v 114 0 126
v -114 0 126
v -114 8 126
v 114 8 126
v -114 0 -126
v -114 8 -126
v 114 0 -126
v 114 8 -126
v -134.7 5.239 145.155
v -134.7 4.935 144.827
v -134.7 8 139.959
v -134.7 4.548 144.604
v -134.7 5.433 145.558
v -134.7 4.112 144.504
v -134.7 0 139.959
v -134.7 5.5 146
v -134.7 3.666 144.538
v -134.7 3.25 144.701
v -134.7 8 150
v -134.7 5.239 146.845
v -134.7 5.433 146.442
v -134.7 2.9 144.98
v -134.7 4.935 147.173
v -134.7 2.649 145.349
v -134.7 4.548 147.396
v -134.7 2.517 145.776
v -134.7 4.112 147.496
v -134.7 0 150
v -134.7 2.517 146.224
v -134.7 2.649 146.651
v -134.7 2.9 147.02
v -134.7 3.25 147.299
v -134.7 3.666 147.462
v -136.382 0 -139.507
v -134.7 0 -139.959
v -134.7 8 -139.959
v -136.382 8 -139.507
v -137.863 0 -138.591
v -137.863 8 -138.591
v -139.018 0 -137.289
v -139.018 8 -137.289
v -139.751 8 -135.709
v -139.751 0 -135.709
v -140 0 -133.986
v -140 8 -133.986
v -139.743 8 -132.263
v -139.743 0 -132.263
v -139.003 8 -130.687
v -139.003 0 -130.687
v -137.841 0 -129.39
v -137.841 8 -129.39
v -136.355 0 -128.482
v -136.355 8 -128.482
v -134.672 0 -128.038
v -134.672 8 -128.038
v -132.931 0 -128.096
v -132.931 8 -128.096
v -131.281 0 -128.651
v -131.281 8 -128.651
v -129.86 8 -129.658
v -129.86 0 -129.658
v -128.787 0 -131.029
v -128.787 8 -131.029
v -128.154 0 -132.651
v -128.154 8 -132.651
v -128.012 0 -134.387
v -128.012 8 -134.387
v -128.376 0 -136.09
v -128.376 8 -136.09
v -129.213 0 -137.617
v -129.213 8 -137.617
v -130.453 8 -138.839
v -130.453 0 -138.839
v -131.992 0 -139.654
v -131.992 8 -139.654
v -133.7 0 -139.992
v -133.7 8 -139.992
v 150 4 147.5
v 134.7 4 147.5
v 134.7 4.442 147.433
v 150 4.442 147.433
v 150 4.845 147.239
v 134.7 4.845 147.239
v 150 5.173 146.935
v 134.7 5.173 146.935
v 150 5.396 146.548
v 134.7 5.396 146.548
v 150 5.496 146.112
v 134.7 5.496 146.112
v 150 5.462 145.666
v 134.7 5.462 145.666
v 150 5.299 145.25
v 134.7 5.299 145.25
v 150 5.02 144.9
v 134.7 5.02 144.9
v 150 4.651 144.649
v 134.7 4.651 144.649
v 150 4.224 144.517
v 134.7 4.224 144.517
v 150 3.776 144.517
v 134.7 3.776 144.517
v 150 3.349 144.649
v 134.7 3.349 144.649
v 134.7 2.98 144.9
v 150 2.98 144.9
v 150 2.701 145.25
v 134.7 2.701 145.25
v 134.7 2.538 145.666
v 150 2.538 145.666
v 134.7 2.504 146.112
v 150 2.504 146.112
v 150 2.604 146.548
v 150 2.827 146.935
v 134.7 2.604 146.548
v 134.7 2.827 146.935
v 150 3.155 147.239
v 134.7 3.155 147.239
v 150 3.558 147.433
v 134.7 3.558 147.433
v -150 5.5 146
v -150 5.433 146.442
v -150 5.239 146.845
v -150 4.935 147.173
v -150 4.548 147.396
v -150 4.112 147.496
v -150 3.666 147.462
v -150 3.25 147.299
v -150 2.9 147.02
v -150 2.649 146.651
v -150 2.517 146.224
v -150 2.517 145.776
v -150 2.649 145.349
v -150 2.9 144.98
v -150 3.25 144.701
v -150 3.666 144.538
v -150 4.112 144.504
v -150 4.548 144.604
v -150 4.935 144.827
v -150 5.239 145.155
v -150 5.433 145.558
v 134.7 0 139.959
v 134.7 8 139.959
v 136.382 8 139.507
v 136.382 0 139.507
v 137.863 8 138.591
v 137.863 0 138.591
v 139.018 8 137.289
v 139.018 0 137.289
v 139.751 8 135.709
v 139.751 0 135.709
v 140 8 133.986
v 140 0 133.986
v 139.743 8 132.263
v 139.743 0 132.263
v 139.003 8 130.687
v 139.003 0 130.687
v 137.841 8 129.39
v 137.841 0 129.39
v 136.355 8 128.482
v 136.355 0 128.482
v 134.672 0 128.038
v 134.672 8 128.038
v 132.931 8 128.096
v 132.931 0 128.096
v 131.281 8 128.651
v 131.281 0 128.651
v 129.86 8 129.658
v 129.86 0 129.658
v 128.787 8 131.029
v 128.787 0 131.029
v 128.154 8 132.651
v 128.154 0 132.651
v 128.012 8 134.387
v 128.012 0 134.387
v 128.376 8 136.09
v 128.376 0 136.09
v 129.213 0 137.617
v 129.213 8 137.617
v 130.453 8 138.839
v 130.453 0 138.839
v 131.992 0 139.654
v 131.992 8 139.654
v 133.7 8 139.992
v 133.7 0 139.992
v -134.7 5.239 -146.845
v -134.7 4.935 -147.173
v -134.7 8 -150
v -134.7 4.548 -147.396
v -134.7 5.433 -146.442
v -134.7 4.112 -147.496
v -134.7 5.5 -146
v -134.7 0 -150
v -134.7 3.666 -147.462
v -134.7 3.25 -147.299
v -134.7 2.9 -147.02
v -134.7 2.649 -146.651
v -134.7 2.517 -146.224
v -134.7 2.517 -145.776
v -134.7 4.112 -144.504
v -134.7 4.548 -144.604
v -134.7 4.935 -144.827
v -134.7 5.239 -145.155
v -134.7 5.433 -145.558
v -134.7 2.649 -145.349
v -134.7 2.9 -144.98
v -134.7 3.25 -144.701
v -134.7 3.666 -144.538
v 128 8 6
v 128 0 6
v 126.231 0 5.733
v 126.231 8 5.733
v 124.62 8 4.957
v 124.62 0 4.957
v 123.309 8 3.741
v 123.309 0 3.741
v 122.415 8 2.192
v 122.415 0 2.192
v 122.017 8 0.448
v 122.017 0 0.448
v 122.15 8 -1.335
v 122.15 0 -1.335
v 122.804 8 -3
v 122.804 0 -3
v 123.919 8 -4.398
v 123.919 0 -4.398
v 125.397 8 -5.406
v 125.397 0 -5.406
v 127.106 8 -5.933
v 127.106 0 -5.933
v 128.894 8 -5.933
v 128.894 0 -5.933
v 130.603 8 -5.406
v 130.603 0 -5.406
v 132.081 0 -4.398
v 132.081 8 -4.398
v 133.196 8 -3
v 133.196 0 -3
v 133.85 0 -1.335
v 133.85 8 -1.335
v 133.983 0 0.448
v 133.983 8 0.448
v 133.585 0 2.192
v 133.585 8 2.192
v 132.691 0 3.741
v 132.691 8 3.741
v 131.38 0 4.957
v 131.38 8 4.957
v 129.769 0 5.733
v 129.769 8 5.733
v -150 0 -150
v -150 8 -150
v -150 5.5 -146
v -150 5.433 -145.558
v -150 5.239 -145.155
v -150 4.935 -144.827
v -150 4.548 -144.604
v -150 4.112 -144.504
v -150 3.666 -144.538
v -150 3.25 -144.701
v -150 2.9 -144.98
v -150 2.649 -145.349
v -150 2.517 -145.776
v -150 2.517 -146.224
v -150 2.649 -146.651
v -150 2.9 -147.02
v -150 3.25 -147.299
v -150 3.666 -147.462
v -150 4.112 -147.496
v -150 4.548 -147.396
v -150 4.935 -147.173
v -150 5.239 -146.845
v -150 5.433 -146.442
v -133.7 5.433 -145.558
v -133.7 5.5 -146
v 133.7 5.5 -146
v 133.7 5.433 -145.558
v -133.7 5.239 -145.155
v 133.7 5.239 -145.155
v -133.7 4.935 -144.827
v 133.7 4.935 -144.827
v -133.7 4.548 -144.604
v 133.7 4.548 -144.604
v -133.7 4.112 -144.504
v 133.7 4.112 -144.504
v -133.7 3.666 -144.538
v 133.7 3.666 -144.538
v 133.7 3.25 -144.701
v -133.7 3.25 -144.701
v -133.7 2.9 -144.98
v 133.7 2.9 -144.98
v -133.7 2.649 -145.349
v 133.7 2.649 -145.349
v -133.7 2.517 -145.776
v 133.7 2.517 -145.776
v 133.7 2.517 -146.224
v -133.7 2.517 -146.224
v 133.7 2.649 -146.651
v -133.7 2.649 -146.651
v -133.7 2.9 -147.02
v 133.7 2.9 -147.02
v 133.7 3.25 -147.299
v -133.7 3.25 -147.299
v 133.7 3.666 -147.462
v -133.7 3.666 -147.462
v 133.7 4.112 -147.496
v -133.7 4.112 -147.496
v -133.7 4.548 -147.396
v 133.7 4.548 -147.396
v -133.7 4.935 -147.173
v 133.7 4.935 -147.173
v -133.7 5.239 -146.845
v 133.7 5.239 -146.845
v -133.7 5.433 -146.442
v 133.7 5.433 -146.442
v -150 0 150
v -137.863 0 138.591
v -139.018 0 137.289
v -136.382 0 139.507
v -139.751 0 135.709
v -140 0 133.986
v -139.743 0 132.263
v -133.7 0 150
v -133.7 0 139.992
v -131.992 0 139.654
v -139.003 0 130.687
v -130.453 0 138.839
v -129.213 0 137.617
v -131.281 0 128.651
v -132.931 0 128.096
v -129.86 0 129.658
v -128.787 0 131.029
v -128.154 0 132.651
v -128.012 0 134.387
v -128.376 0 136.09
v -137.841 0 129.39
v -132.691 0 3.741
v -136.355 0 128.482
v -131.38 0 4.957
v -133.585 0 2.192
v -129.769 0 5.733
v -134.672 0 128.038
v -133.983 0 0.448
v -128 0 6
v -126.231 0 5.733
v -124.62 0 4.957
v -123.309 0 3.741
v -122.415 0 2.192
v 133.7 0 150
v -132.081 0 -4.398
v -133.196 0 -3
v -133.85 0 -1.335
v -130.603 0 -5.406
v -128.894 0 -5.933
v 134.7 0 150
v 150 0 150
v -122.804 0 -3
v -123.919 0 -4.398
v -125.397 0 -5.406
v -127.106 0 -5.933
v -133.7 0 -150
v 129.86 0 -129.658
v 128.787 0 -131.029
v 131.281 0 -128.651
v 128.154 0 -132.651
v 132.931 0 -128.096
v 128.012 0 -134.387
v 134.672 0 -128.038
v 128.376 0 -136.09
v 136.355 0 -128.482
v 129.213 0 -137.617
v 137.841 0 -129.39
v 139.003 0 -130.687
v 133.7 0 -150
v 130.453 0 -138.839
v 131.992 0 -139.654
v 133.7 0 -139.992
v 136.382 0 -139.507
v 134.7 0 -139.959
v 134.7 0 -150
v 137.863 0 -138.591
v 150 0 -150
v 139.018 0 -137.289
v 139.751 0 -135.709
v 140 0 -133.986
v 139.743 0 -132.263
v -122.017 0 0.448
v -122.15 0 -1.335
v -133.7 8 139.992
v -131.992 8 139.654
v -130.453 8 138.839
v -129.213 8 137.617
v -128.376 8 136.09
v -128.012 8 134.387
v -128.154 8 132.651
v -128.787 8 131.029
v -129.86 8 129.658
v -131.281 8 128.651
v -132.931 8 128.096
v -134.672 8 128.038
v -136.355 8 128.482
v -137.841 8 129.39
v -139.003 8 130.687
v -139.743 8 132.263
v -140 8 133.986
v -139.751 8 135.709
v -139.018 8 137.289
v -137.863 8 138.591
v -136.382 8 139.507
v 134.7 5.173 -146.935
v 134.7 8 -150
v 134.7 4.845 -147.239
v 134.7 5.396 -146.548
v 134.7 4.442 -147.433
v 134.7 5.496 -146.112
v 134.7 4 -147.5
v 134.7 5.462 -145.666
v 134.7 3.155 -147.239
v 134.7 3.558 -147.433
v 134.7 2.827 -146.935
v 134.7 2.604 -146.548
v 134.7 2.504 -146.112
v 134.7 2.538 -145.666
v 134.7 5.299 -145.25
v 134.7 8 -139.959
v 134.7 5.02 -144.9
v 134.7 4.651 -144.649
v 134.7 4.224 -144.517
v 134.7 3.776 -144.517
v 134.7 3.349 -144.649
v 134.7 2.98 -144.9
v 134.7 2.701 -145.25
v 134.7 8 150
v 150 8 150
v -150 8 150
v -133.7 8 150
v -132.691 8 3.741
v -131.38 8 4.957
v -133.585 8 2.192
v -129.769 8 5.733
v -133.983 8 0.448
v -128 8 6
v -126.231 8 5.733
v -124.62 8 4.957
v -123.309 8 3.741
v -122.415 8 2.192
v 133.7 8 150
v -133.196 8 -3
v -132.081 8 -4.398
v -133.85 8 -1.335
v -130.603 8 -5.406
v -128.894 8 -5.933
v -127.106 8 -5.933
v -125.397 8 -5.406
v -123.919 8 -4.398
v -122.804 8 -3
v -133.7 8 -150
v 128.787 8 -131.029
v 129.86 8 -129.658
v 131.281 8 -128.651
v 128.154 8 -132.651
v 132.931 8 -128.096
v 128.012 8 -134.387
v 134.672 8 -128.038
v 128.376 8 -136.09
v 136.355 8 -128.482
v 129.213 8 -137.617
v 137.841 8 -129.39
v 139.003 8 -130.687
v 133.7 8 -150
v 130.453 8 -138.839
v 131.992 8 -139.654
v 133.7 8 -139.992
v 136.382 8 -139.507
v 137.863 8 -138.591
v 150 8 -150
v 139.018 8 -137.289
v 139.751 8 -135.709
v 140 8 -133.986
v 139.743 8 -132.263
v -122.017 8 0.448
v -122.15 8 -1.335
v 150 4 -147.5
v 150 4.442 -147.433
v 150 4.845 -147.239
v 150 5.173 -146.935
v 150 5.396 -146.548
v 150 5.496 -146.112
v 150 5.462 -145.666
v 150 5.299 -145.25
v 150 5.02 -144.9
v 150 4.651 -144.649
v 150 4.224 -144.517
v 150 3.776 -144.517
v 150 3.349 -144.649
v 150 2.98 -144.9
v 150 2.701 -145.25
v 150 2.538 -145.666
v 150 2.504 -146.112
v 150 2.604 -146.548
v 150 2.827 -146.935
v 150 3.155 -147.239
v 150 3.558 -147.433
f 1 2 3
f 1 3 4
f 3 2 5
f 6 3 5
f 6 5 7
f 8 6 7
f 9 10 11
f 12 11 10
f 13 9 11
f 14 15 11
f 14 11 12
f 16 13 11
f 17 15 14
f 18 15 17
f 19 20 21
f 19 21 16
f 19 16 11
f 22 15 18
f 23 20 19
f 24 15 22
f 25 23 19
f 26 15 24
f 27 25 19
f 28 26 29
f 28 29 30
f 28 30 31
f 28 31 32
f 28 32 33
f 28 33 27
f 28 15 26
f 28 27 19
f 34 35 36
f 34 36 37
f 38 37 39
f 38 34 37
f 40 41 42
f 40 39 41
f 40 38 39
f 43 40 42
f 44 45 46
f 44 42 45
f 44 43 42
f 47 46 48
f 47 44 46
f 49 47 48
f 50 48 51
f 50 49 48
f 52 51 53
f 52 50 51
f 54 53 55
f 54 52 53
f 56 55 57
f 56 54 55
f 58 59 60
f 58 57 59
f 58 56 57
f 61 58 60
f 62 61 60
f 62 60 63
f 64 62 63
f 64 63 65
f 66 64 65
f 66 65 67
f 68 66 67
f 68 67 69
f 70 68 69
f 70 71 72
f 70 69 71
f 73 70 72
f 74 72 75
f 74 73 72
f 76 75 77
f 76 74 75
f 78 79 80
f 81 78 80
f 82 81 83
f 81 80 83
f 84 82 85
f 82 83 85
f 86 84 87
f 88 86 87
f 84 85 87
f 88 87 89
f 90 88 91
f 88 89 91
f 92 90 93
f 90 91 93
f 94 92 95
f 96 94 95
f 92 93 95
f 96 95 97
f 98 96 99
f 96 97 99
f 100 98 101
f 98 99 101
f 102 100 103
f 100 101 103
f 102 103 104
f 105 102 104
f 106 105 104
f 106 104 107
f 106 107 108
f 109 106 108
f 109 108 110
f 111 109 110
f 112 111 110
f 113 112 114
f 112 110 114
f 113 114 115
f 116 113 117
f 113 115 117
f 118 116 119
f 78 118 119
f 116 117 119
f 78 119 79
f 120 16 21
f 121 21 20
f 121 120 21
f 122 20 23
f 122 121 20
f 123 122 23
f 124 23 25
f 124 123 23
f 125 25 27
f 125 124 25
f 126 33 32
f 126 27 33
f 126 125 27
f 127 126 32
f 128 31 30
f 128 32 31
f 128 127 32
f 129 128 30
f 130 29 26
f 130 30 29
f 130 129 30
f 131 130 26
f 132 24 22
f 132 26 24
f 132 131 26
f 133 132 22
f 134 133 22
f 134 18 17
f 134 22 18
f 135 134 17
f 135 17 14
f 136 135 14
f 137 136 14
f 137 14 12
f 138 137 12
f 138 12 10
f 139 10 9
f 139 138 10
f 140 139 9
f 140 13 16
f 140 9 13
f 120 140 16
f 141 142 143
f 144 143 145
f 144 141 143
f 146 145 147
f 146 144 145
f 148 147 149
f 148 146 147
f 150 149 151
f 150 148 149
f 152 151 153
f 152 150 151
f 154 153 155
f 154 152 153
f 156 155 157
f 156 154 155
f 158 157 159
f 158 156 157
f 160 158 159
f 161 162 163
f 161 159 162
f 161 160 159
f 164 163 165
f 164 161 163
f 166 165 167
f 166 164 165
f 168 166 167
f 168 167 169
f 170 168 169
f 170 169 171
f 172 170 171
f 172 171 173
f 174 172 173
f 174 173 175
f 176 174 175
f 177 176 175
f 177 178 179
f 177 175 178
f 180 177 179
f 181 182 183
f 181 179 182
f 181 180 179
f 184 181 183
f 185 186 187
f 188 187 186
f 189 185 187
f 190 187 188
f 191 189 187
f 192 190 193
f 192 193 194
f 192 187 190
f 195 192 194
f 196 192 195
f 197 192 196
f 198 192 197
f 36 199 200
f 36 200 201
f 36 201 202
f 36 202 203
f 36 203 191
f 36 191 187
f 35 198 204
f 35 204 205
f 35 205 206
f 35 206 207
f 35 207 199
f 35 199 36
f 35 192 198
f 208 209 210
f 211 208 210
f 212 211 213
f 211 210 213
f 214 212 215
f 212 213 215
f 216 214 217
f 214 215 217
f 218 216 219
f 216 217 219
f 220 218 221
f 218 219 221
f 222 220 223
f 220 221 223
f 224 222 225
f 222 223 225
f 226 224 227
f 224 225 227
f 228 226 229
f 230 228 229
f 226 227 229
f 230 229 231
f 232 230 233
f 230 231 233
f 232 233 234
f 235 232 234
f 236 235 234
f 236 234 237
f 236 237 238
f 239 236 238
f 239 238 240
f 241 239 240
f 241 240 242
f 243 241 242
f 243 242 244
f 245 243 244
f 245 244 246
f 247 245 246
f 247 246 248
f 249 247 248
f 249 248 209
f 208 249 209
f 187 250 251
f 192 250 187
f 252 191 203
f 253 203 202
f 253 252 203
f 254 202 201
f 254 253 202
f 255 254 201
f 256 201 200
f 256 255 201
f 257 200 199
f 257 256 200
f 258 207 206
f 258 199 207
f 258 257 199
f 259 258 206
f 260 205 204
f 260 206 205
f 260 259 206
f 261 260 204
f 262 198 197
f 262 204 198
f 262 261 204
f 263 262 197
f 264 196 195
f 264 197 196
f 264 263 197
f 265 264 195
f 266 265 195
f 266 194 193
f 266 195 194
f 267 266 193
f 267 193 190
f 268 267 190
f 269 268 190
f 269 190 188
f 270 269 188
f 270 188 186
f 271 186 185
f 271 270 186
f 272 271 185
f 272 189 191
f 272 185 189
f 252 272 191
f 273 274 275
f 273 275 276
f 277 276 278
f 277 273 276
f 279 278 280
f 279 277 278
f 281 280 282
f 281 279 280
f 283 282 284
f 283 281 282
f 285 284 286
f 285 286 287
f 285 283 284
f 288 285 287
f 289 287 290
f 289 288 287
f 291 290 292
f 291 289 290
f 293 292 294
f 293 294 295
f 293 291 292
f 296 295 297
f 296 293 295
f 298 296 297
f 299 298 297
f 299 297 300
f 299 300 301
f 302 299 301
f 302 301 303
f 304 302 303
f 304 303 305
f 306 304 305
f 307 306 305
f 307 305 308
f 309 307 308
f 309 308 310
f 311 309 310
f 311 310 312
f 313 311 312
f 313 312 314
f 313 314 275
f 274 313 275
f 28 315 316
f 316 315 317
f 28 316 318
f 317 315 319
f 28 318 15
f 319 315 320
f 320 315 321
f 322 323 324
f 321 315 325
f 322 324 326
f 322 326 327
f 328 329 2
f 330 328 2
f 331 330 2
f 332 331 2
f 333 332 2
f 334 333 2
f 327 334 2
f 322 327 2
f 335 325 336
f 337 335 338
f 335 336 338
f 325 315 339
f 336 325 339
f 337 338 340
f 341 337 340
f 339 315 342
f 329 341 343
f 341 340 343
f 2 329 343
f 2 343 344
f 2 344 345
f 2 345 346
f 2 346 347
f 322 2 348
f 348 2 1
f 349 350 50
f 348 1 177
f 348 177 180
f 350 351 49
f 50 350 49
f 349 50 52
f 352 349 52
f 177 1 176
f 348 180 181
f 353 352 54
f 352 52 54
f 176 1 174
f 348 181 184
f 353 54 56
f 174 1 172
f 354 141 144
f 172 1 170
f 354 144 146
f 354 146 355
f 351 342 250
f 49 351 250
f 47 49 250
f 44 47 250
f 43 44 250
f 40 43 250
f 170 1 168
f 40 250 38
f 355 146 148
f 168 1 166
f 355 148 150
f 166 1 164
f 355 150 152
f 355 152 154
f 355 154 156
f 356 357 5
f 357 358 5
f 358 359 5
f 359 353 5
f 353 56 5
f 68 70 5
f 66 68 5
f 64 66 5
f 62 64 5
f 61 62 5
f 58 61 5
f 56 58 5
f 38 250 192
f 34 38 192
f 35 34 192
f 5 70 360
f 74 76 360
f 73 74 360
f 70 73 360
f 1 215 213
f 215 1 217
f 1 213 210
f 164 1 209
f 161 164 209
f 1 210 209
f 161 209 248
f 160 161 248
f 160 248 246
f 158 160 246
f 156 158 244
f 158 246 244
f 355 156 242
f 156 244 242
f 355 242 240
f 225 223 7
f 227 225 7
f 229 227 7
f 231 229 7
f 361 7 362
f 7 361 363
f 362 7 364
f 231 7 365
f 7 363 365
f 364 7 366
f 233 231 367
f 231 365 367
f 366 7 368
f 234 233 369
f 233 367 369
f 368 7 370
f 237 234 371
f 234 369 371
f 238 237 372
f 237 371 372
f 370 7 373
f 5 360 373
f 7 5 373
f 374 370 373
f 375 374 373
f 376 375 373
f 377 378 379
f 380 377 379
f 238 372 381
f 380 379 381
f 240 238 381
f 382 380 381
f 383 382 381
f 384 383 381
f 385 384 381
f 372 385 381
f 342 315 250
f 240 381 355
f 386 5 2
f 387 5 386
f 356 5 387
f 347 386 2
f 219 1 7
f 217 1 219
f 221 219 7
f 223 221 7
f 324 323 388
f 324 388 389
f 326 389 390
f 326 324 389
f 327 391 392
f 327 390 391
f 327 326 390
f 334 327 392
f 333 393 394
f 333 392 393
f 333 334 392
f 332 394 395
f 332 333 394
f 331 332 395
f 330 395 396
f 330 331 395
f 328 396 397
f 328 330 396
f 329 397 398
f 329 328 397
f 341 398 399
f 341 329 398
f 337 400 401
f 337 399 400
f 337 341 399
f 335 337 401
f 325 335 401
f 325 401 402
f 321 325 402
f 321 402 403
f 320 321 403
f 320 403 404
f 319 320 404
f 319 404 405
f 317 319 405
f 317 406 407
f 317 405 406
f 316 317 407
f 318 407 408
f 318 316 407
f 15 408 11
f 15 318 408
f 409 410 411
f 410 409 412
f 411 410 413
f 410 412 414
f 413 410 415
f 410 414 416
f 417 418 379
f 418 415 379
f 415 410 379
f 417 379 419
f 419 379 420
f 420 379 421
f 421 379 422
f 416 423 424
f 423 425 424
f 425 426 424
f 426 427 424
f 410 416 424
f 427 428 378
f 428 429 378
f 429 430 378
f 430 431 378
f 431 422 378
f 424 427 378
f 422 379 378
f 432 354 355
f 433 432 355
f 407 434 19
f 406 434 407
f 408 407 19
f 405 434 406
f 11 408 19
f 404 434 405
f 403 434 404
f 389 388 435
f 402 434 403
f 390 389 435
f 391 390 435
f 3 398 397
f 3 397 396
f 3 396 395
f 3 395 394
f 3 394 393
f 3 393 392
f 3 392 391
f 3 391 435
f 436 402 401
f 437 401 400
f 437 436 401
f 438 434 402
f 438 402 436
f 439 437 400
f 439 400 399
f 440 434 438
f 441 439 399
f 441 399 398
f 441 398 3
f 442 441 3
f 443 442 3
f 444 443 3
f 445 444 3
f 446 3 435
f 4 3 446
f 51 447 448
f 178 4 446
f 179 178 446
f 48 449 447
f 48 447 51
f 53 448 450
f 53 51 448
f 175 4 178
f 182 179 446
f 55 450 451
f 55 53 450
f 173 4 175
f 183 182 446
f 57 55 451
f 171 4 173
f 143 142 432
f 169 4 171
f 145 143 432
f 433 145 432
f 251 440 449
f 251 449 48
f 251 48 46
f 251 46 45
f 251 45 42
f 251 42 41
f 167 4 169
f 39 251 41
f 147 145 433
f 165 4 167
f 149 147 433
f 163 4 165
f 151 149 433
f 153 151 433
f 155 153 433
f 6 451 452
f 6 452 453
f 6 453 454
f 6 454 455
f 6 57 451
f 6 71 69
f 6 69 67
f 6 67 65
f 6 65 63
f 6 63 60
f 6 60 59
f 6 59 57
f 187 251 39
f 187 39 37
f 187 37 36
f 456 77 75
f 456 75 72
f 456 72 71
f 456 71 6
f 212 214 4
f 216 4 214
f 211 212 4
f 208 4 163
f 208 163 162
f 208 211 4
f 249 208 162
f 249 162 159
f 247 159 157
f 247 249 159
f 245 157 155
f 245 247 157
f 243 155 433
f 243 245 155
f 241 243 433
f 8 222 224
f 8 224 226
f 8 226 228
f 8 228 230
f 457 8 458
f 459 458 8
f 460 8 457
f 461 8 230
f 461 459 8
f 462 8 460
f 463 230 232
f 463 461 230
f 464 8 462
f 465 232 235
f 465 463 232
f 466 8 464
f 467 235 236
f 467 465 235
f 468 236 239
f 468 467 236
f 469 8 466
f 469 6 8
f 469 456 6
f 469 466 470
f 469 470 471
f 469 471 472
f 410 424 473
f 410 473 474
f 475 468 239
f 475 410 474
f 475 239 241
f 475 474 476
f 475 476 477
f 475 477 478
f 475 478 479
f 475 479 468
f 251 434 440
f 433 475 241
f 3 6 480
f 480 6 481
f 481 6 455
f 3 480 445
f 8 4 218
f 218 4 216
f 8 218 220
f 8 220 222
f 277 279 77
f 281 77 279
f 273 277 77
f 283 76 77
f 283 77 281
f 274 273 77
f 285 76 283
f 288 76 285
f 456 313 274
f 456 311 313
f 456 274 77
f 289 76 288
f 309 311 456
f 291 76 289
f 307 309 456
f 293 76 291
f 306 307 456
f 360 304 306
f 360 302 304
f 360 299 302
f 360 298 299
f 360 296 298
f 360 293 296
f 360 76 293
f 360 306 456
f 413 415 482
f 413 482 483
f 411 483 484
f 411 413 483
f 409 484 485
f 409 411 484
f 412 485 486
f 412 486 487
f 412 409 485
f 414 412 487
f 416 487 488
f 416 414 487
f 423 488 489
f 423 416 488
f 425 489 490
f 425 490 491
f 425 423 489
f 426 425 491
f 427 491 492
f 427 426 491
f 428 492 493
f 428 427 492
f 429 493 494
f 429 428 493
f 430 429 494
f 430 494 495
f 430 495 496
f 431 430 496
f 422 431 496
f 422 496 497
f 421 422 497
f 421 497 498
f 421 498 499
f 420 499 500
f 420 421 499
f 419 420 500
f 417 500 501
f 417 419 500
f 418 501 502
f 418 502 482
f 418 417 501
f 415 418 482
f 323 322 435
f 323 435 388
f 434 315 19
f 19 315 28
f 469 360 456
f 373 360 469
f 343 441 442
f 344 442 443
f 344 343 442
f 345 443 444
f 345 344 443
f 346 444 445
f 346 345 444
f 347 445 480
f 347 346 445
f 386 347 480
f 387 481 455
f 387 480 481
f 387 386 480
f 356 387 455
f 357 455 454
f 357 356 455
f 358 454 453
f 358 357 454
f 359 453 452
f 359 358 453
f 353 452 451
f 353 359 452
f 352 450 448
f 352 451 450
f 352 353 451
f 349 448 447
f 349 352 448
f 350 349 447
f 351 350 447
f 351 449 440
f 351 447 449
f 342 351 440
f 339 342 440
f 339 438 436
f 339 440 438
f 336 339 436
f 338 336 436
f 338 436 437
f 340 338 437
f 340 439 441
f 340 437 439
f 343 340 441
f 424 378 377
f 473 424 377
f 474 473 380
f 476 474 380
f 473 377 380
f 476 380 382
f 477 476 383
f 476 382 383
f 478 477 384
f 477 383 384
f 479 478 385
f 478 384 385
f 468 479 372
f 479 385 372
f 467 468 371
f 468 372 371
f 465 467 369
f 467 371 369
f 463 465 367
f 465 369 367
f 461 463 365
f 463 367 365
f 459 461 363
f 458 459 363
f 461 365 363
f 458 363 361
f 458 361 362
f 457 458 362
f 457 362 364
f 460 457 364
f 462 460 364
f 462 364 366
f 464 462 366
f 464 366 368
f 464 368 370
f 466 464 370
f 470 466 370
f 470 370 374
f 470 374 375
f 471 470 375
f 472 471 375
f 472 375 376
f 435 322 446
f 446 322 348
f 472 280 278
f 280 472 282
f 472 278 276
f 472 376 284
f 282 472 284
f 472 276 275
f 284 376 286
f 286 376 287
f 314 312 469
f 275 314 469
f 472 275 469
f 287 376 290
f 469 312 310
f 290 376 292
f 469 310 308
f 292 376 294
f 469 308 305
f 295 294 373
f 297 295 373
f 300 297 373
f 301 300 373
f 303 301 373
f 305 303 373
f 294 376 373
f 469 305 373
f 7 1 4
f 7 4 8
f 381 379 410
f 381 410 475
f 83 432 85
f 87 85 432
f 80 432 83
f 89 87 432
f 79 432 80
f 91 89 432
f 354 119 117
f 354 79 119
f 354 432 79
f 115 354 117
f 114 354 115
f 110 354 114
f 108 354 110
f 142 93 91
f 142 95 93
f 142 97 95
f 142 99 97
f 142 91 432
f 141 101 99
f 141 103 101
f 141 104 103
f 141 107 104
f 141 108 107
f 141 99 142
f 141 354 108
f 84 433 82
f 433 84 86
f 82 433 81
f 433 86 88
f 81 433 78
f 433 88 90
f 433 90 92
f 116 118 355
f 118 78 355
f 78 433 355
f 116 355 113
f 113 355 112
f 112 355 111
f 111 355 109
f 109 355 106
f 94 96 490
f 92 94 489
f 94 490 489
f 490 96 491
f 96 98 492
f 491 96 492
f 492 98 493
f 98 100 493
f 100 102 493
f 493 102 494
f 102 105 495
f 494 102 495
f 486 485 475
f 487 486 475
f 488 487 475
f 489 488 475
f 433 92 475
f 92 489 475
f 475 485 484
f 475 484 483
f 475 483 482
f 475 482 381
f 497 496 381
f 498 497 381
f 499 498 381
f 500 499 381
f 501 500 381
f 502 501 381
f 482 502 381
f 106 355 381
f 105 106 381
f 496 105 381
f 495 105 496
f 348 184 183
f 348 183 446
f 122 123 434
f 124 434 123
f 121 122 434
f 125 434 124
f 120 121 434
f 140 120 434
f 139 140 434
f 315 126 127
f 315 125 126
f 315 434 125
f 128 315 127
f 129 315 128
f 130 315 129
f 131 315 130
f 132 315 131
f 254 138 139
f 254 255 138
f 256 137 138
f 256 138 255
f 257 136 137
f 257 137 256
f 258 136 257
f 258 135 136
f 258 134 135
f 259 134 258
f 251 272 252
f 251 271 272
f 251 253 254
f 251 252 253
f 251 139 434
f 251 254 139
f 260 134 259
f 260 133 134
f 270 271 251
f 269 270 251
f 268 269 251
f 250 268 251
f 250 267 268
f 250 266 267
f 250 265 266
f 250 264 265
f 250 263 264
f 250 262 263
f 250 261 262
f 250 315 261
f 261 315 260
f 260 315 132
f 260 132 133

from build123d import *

# Parameters (mm, degrees)
SKETCH1_W           = 300
SKETCH1_H           = 300
SKETCH1_W_2         = 228
SKETCH1_H_2         = 252
BOSS_EXTRUDE1_DEPTH = 8
CUT_EXTRUDE1_DEPTH  = 213.282830205
CUT_EXTRUDE2_START  = -15.3
SKETCH3_R           = 1.5
CUT_EXTRUDE2_DEPTH  = 15.3
MIRROR4_START       = -151
MIRROR4_OUTLINE_R   = 1.5
MIRROR4_DEPTH       = 284.7
MIRROR4_2_OUTLINE_R = 1.5
MIRROR4_2_DEPTH     = 17.3
MIRROR4_START_2     = -1
MIRROR4_3_DEPTH     = 10
SKETCH4_R           = 6
CUT_EXTRUDE3_DEPTH  = 213.282830205


with BuildPart() as part:
    # Sketch1 → Boss-Extrude1 (new body)
    with BuildSketch(Plane(origin=(0, 0, 0), x_dir=(1, 0, 0), z_dir=(0, 1, 0))):
        Rectangle(SKETCH1_W, SKETCH1_H)
        Rectangle(SKETCH1_W_2, SKETCH1_H_2, mode=Mode.SUBTRACT)
    extrude(amount=BOSS_EXTRUDE1_DEPTH)

    # Sketch2 → Cut-Extrude1 (cut, through all)
    with BuildSketch(Plane(origin=(0, 0, 0), x_dir=(1, 0, 0), z_dir=(0, 1, 0))):
        with BuildLine():
            Line((133.7, 150), (134.7, 150))
            Line((134.7, 150), (134.7, 139.959026766))
            ThreePointArc((134.7, 139.959026766), (133.799301132, 128.003357609), (133.7, 139.992495307))
            Line((133.7, 139.992495307), (133.7, 150))
        make_face()
    cut_extrude1 = extrude(amount=CUT_EXTRUDE1_DEPTH, mode=Mode.SUBTRACT)

    # Sketch3 → Cut-Extrude2 (cut)
    with BuildSketch(Plane(origin=(150, 0, 0), x_dir=(0, 0, -1), z_dir=(1, 0, 0)).offset(CUT_EXTRUDE2_START)):
        with Locations((146, 4)):
            Circle(SKETCH3_R)
    cut_extrude2 = extrude(amount=CUT_EXTRUDE2_DEPTH, mode=Mode.SUBTRACT)

    # Mirror3: Cut-Extrude1, Cut-Extrude2 across plane
    add(cut_extrude1.mirror(Plane.XY), mode=Mode.SUBTRACT)
    add(cut_extrude2.mirror(Plane.XY), mode=Mode.SUBTRACT)

    # Mirror4: read off the stored shape, not the designer's step
    # Mirror4 outline → Mirror4 (cut)
    with BuildSketch(Plane.YZ.offset(MIRROR4_START)):
        with Locations((4, -146)):
            Circle(MIRROR4_OUTLINE_R)
    extrude(amount=MIRROR4_DEPTH, mode=Mode.SUBTRACT)

    # Mirror4 2 outline → Mirror4 2 (cut)
    with BuildSketch(Plane.YZ.offset(MIRROR4_START)):
        with Locations((4, 146)):
            Circle(MIRROR4_2_OUTLINE_R)
    extrude(amount=MIRROR4_2_DEPTH, mode=Mode.SUBTRACT)

    # Mirror4 3 outline → Mirror4 3 (cut)
    with BuildSketch(Plane(origin=(0, 0, 0), x_dir=(1, 0, 0), z_dir=(0, 1, 0)).offset(MIRROR4_START_2)):
        with BuildLine():
            ThreePointArc((-134.7, 139.959026766), (-133.799301125, 128.003357609), (-133.7, 139.992495307))
            Line((-133.7, 139.992495307), (-133.7, 150))
            Line((-133.7, 150), (-134.7, 150))
            Line((-134.7, 150), (-134.7, 139.959026766))
        make_face()
        with BuildLine():
            Line((-133.7, -150), (-133.7, -139.992495307))
            ThreePointArc((-133.7, -139.992495307), (-133.799301125, -128.003357609), (-134.7, -139.959026766))
            Line((-134.7, -139.959026766), (-134.7, -150))
            Line((-134.7, -150), (-133.7, -150))
        make_face()
    extrude(amount=MIRROR4_3_DEPTH, mode=Mode.SUBTRACT)

    # Sketch4 → Cut-Extrude3 (cut, through all)
    with BuildSketch(Plane(origin=(0, 0, 0), x_dir=(1, 0, 0), z_dir=(0, 1, 0))):
        with Locations(Location((-128, 0, 0), (0, 0, 270))):
            Circle(SKETCH4_R)
    cut_extrude3 = extrude(amount=CUT_EXTRUDE3_DEPTH, mode=Mode.SUBTRACT)

    # Mirror5: Cut-Extrude3 across plane
    add(cut_extrude3.mirror(Plane(origin=(0, 0, 0), x_dir=(0, 0, 1), z_dir=(1, 0, 0))), mode=Mode.SUBTRACT)


solid = part.part
